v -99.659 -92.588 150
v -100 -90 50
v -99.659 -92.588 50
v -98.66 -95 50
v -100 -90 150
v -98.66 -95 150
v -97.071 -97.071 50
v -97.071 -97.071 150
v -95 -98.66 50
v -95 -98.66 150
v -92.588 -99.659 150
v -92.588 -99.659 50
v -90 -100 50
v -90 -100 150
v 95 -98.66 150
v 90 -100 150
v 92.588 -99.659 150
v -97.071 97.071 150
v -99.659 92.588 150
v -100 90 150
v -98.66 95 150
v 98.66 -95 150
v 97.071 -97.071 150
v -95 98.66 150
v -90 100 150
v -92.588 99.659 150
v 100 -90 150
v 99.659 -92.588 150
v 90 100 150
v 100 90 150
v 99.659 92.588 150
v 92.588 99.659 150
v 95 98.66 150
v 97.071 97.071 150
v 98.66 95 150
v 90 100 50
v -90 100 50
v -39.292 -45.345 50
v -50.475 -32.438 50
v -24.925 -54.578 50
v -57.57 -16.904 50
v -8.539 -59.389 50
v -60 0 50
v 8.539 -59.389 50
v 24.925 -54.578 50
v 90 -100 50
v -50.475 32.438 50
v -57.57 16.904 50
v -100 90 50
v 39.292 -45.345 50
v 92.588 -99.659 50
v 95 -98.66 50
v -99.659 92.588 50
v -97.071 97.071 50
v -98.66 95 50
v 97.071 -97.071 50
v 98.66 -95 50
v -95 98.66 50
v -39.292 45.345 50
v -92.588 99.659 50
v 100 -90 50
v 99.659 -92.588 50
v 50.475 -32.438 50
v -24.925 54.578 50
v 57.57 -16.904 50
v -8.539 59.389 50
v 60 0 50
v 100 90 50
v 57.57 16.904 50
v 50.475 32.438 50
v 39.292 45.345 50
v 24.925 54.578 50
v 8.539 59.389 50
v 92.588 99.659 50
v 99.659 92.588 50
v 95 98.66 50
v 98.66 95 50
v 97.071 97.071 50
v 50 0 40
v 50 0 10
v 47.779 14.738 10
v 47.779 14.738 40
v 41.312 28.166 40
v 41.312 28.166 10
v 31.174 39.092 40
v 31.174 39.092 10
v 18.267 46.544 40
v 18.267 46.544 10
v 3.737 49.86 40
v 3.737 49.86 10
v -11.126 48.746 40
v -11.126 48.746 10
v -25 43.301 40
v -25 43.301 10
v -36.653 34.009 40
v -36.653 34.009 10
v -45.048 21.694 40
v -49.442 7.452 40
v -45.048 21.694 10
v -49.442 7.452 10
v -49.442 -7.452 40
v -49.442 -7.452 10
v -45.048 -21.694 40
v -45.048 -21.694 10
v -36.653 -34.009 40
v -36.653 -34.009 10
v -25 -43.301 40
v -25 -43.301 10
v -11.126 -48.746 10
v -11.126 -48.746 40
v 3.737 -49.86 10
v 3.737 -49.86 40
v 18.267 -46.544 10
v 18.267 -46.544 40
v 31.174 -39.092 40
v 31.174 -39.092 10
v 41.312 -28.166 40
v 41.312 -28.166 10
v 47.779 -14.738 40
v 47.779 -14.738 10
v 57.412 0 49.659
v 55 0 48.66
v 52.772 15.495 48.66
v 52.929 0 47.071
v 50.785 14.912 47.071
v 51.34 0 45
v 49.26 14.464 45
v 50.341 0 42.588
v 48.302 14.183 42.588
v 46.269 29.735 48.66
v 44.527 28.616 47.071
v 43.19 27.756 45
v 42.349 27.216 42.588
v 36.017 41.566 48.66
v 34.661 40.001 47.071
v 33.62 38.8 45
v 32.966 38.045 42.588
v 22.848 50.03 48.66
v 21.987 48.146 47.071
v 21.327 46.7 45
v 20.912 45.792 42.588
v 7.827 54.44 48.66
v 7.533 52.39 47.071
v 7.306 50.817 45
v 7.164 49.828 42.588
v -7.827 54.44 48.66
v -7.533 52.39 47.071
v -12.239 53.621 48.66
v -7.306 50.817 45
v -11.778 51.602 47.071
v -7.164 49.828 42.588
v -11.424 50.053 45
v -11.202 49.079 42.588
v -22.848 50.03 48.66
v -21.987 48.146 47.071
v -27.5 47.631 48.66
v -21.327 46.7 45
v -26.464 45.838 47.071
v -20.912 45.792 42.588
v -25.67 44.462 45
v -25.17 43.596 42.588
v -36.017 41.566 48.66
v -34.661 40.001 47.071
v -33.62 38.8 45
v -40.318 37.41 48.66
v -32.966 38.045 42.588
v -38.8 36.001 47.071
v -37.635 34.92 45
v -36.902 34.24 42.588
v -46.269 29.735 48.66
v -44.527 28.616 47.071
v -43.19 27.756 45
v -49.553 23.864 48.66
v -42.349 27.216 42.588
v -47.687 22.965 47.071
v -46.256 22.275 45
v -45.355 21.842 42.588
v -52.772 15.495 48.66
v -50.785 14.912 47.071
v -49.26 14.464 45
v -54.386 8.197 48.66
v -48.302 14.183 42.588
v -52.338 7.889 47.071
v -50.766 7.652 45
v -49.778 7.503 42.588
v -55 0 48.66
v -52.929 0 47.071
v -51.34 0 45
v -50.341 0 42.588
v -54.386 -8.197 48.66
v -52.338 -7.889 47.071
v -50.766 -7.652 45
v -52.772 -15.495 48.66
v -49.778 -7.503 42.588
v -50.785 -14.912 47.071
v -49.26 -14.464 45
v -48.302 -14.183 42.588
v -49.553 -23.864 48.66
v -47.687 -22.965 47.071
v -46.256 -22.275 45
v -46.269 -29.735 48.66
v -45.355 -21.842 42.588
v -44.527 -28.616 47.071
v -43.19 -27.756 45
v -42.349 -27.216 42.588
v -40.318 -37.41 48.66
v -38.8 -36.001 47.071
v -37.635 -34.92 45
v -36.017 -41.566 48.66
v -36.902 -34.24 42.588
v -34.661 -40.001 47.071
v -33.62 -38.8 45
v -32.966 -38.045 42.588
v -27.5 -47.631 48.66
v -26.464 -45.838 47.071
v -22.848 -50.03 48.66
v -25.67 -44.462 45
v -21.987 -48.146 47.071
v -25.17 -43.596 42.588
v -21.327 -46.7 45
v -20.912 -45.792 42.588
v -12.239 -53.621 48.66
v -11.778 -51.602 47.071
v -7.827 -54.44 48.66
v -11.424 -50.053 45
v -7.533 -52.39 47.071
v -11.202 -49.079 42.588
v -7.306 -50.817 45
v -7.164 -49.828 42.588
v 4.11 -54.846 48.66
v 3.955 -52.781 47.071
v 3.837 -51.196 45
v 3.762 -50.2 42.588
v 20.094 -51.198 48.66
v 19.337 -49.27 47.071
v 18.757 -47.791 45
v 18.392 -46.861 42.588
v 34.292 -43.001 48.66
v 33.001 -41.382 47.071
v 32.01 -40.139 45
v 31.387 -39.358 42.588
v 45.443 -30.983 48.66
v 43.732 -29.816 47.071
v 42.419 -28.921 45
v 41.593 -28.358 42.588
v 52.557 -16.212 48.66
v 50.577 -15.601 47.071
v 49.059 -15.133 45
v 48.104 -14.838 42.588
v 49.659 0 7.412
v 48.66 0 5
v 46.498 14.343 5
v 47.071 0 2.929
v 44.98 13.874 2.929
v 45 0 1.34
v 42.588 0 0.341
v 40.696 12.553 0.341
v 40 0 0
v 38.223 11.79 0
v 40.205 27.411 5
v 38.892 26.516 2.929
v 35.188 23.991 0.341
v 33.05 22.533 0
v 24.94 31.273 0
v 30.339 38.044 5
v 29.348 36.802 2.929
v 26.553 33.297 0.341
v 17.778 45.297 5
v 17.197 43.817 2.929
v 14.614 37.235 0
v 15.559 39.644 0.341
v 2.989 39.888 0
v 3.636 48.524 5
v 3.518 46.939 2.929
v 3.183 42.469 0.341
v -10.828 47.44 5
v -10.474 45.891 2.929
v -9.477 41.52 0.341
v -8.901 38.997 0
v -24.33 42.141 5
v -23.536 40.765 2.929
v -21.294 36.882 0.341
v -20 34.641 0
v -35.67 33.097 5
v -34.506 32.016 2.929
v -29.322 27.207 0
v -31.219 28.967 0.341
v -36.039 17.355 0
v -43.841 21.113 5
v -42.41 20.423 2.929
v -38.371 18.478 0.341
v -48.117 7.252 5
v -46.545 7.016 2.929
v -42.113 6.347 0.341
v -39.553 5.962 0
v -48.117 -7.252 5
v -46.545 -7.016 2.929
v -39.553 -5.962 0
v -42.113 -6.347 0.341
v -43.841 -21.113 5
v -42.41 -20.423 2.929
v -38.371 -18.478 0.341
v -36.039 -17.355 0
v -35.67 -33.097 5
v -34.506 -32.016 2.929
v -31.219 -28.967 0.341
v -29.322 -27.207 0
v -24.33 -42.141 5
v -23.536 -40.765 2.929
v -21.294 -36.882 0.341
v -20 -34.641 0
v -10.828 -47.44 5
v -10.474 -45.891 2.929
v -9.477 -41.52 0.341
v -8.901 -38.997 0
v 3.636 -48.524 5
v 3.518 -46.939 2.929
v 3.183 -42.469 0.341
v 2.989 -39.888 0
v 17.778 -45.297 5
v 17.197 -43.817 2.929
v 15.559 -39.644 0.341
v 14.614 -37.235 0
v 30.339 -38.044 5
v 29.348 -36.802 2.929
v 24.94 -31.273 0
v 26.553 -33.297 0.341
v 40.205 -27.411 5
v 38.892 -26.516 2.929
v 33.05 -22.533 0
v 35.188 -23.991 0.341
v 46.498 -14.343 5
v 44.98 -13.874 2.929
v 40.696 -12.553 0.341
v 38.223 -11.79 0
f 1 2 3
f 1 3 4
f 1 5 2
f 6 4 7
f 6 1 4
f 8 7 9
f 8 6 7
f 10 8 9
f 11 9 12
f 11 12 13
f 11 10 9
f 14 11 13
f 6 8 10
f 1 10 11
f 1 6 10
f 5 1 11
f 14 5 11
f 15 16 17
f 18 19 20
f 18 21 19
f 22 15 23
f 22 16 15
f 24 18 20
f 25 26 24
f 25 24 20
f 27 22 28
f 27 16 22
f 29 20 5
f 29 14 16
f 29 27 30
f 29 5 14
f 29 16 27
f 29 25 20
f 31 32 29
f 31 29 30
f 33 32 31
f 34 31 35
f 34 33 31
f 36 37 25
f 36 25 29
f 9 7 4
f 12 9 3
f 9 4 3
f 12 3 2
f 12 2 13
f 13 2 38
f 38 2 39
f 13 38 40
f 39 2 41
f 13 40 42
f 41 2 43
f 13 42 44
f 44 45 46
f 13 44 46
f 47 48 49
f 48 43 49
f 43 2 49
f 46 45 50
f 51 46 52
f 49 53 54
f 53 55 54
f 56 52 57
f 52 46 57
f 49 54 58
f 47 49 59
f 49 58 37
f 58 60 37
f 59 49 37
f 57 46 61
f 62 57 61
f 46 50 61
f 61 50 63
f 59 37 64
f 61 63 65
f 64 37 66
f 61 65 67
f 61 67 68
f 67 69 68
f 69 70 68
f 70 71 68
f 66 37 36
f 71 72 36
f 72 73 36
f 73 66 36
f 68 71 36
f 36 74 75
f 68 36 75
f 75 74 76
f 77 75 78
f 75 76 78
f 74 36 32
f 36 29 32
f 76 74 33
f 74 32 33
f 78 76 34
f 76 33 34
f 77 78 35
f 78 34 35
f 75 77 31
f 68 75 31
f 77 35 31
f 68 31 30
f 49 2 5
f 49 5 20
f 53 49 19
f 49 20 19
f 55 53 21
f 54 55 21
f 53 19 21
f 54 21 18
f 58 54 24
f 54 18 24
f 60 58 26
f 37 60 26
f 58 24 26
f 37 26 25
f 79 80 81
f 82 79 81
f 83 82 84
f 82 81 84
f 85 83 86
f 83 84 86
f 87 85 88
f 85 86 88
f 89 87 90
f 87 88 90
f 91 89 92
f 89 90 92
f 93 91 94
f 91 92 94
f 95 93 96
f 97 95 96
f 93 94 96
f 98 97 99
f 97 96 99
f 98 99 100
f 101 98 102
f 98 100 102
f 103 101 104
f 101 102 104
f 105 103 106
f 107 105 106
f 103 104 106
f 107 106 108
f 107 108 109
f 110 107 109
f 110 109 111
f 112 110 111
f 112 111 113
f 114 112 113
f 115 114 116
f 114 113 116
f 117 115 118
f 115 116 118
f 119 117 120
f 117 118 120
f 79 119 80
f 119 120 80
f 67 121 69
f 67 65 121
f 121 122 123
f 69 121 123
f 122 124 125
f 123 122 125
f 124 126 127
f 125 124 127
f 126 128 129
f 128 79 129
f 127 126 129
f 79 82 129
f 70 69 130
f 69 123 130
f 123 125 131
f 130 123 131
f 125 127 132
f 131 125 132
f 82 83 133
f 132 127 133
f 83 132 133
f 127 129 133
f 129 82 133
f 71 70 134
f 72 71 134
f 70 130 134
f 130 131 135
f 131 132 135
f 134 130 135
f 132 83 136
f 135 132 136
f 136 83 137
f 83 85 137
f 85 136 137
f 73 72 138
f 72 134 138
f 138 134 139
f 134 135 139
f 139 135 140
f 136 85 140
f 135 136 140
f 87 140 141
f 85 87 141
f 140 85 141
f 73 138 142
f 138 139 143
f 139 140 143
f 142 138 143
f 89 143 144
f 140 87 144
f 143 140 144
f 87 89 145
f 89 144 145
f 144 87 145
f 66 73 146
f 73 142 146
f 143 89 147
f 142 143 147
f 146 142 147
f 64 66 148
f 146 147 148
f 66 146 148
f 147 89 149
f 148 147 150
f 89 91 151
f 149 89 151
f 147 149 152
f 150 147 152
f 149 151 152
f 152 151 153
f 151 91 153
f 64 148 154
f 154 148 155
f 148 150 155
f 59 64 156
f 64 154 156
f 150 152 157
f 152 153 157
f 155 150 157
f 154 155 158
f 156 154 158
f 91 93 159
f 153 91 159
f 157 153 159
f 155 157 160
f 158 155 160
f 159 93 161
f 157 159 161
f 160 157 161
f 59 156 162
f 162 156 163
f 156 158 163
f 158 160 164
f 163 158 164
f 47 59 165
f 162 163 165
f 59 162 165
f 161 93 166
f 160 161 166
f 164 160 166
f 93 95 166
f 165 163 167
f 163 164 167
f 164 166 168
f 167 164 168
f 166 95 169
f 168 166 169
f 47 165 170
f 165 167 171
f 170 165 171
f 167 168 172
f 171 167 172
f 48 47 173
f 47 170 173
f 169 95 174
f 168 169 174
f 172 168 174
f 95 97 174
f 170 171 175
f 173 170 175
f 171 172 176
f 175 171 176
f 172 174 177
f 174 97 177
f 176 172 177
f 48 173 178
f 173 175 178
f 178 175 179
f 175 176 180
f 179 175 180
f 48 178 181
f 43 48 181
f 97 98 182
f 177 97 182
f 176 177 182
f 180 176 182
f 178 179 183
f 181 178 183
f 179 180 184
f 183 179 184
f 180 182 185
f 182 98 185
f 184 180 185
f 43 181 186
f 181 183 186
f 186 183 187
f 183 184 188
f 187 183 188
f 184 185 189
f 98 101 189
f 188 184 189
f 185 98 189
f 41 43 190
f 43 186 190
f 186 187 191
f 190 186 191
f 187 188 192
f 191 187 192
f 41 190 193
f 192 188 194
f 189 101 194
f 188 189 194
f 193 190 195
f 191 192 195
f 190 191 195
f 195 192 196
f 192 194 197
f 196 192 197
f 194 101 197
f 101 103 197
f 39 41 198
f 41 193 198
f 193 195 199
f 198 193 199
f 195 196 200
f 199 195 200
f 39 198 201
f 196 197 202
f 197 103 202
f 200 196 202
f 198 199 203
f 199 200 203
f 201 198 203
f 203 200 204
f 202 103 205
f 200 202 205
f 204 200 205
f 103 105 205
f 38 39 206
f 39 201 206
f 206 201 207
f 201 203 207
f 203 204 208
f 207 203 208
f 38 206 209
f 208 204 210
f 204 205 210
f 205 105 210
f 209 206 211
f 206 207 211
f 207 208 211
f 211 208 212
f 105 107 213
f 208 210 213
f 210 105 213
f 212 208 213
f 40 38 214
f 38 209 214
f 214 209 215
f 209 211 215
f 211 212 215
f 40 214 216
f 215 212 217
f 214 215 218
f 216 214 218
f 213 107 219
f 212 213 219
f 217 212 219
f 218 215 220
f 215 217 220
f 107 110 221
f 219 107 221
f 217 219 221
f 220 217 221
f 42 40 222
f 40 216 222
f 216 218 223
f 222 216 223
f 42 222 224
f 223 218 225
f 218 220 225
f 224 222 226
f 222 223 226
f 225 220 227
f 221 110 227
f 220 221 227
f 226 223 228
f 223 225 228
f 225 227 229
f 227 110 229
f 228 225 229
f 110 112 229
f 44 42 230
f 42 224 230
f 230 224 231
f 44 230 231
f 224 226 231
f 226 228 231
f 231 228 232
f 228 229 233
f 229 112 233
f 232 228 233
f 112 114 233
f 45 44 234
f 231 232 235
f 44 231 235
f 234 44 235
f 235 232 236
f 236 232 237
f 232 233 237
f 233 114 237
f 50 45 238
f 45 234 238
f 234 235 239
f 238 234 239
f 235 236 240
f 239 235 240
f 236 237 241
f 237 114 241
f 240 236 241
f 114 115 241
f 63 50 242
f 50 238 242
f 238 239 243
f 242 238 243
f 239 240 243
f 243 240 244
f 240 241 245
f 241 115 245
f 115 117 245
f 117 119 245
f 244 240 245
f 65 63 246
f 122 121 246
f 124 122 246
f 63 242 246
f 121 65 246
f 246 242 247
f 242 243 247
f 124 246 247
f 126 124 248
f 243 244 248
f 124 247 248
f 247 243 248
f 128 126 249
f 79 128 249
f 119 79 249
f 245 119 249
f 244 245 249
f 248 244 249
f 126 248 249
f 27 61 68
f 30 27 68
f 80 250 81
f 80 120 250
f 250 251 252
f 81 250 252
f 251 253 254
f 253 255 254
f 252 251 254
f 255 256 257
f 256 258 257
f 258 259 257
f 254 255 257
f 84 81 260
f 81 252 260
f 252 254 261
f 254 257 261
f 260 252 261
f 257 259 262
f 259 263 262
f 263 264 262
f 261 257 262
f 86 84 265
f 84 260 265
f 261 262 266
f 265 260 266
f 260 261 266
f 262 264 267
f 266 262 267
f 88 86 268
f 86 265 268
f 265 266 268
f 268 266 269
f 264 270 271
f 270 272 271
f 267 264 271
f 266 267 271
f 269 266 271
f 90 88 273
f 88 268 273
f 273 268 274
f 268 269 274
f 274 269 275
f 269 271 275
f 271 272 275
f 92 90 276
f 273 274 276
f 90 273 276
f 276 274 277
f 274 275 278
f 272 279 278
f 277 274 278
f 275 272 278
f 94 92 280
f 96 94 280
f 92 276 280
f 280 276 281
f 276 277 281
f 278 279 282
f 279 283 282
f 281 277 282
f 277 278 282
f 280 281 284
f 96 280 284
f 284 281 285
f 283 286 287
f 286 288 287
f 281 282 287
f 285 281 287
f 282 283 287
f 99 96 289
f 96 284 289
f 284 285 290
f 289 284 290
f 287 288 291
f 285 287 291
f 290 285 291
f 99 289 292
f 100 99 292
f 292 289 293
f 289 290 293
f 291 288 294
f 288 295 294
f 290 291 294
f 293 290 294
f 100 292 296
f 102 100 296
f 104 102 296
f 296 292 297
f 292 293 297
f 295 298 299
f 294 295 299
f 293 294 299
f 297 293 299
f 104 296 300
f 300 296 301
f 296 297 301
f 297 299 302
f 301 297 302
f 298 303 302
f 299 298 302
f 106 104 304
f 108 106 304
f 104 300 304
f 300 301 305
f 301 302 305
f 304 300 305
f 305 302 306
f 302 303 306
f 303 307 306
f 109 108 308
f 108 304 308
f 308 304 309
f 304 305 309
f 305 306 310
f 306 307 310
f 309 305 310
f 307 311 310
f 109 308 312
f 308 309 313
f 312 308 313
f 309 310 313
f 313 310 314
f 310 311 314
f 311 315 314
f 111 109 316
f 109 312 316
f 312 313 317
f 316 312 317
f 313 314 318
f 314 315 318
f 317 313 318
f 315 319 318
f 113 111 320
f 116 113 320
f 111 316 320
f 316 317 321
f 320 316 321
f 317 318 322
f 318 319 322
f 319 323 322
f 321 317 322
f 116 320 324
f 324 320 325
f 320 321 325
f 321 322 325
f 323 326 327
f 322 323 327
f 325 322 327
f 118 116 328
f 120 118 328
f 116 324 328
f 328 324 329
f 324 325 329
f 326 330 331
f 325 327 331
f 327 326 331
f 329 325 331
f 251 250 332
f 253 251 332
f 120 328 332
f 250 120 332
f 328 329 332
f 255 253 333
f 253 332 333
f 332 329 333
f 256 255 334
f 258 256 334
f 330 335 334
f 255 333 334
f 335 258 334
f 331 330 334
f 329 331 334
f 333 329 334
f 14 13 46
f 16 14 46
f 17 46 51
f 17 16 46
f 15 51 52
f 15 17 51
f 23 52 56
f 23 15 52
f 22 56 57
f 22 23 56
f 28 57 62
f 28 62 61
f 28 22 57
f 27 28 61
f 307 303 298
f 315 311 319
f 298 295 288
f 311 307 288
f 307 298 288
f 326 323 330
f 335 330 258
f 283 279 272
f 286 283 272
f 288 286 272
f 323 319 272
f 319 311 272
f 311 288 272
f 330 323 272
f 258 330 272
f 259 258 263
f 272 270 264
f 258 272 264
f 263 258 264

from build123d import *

# Parameters (mm, degrees)
SKETCH_1_R      = 50
EXTRUDE_1_DEPTH = 50
SKETCH_2_W      = 200
SKETCH_2_H      = 200
EXTRUDE_2_DEPTH = 100
FILLET_1_R      = 10


with BuildPart() as part:
    # 草图1 → 凸台-拉伸1 (new body)
    with BuildSketch(Plane.XY):
        Circle(SKETCH_1_R)
    extrude(amount=EXTRUDE_1_DEPTH)

    # 草图2 → 凸台-拉伸2 (add)
    with BuildSketch(Plane.XY.offset(50)):
        Rectangle(SKETCH_2_W, SKETCH_2_H)
    extrude(amount=EXTRUDE_2_DEPTH)

    # 圆角1
    fillet_1_edges = [part.edges().sort_by_distance(p)[0] for p in [
        (-50, 0, 0),
        (-50, 0, 50),
        (-100, 100, 100),
        (-100, -100, 100),
        (100, -100, 100),
        (100, 100, 100),
    ]]
    fillet(fillet_1_edges, radius=FILLET_1_R)


solid = part.part
